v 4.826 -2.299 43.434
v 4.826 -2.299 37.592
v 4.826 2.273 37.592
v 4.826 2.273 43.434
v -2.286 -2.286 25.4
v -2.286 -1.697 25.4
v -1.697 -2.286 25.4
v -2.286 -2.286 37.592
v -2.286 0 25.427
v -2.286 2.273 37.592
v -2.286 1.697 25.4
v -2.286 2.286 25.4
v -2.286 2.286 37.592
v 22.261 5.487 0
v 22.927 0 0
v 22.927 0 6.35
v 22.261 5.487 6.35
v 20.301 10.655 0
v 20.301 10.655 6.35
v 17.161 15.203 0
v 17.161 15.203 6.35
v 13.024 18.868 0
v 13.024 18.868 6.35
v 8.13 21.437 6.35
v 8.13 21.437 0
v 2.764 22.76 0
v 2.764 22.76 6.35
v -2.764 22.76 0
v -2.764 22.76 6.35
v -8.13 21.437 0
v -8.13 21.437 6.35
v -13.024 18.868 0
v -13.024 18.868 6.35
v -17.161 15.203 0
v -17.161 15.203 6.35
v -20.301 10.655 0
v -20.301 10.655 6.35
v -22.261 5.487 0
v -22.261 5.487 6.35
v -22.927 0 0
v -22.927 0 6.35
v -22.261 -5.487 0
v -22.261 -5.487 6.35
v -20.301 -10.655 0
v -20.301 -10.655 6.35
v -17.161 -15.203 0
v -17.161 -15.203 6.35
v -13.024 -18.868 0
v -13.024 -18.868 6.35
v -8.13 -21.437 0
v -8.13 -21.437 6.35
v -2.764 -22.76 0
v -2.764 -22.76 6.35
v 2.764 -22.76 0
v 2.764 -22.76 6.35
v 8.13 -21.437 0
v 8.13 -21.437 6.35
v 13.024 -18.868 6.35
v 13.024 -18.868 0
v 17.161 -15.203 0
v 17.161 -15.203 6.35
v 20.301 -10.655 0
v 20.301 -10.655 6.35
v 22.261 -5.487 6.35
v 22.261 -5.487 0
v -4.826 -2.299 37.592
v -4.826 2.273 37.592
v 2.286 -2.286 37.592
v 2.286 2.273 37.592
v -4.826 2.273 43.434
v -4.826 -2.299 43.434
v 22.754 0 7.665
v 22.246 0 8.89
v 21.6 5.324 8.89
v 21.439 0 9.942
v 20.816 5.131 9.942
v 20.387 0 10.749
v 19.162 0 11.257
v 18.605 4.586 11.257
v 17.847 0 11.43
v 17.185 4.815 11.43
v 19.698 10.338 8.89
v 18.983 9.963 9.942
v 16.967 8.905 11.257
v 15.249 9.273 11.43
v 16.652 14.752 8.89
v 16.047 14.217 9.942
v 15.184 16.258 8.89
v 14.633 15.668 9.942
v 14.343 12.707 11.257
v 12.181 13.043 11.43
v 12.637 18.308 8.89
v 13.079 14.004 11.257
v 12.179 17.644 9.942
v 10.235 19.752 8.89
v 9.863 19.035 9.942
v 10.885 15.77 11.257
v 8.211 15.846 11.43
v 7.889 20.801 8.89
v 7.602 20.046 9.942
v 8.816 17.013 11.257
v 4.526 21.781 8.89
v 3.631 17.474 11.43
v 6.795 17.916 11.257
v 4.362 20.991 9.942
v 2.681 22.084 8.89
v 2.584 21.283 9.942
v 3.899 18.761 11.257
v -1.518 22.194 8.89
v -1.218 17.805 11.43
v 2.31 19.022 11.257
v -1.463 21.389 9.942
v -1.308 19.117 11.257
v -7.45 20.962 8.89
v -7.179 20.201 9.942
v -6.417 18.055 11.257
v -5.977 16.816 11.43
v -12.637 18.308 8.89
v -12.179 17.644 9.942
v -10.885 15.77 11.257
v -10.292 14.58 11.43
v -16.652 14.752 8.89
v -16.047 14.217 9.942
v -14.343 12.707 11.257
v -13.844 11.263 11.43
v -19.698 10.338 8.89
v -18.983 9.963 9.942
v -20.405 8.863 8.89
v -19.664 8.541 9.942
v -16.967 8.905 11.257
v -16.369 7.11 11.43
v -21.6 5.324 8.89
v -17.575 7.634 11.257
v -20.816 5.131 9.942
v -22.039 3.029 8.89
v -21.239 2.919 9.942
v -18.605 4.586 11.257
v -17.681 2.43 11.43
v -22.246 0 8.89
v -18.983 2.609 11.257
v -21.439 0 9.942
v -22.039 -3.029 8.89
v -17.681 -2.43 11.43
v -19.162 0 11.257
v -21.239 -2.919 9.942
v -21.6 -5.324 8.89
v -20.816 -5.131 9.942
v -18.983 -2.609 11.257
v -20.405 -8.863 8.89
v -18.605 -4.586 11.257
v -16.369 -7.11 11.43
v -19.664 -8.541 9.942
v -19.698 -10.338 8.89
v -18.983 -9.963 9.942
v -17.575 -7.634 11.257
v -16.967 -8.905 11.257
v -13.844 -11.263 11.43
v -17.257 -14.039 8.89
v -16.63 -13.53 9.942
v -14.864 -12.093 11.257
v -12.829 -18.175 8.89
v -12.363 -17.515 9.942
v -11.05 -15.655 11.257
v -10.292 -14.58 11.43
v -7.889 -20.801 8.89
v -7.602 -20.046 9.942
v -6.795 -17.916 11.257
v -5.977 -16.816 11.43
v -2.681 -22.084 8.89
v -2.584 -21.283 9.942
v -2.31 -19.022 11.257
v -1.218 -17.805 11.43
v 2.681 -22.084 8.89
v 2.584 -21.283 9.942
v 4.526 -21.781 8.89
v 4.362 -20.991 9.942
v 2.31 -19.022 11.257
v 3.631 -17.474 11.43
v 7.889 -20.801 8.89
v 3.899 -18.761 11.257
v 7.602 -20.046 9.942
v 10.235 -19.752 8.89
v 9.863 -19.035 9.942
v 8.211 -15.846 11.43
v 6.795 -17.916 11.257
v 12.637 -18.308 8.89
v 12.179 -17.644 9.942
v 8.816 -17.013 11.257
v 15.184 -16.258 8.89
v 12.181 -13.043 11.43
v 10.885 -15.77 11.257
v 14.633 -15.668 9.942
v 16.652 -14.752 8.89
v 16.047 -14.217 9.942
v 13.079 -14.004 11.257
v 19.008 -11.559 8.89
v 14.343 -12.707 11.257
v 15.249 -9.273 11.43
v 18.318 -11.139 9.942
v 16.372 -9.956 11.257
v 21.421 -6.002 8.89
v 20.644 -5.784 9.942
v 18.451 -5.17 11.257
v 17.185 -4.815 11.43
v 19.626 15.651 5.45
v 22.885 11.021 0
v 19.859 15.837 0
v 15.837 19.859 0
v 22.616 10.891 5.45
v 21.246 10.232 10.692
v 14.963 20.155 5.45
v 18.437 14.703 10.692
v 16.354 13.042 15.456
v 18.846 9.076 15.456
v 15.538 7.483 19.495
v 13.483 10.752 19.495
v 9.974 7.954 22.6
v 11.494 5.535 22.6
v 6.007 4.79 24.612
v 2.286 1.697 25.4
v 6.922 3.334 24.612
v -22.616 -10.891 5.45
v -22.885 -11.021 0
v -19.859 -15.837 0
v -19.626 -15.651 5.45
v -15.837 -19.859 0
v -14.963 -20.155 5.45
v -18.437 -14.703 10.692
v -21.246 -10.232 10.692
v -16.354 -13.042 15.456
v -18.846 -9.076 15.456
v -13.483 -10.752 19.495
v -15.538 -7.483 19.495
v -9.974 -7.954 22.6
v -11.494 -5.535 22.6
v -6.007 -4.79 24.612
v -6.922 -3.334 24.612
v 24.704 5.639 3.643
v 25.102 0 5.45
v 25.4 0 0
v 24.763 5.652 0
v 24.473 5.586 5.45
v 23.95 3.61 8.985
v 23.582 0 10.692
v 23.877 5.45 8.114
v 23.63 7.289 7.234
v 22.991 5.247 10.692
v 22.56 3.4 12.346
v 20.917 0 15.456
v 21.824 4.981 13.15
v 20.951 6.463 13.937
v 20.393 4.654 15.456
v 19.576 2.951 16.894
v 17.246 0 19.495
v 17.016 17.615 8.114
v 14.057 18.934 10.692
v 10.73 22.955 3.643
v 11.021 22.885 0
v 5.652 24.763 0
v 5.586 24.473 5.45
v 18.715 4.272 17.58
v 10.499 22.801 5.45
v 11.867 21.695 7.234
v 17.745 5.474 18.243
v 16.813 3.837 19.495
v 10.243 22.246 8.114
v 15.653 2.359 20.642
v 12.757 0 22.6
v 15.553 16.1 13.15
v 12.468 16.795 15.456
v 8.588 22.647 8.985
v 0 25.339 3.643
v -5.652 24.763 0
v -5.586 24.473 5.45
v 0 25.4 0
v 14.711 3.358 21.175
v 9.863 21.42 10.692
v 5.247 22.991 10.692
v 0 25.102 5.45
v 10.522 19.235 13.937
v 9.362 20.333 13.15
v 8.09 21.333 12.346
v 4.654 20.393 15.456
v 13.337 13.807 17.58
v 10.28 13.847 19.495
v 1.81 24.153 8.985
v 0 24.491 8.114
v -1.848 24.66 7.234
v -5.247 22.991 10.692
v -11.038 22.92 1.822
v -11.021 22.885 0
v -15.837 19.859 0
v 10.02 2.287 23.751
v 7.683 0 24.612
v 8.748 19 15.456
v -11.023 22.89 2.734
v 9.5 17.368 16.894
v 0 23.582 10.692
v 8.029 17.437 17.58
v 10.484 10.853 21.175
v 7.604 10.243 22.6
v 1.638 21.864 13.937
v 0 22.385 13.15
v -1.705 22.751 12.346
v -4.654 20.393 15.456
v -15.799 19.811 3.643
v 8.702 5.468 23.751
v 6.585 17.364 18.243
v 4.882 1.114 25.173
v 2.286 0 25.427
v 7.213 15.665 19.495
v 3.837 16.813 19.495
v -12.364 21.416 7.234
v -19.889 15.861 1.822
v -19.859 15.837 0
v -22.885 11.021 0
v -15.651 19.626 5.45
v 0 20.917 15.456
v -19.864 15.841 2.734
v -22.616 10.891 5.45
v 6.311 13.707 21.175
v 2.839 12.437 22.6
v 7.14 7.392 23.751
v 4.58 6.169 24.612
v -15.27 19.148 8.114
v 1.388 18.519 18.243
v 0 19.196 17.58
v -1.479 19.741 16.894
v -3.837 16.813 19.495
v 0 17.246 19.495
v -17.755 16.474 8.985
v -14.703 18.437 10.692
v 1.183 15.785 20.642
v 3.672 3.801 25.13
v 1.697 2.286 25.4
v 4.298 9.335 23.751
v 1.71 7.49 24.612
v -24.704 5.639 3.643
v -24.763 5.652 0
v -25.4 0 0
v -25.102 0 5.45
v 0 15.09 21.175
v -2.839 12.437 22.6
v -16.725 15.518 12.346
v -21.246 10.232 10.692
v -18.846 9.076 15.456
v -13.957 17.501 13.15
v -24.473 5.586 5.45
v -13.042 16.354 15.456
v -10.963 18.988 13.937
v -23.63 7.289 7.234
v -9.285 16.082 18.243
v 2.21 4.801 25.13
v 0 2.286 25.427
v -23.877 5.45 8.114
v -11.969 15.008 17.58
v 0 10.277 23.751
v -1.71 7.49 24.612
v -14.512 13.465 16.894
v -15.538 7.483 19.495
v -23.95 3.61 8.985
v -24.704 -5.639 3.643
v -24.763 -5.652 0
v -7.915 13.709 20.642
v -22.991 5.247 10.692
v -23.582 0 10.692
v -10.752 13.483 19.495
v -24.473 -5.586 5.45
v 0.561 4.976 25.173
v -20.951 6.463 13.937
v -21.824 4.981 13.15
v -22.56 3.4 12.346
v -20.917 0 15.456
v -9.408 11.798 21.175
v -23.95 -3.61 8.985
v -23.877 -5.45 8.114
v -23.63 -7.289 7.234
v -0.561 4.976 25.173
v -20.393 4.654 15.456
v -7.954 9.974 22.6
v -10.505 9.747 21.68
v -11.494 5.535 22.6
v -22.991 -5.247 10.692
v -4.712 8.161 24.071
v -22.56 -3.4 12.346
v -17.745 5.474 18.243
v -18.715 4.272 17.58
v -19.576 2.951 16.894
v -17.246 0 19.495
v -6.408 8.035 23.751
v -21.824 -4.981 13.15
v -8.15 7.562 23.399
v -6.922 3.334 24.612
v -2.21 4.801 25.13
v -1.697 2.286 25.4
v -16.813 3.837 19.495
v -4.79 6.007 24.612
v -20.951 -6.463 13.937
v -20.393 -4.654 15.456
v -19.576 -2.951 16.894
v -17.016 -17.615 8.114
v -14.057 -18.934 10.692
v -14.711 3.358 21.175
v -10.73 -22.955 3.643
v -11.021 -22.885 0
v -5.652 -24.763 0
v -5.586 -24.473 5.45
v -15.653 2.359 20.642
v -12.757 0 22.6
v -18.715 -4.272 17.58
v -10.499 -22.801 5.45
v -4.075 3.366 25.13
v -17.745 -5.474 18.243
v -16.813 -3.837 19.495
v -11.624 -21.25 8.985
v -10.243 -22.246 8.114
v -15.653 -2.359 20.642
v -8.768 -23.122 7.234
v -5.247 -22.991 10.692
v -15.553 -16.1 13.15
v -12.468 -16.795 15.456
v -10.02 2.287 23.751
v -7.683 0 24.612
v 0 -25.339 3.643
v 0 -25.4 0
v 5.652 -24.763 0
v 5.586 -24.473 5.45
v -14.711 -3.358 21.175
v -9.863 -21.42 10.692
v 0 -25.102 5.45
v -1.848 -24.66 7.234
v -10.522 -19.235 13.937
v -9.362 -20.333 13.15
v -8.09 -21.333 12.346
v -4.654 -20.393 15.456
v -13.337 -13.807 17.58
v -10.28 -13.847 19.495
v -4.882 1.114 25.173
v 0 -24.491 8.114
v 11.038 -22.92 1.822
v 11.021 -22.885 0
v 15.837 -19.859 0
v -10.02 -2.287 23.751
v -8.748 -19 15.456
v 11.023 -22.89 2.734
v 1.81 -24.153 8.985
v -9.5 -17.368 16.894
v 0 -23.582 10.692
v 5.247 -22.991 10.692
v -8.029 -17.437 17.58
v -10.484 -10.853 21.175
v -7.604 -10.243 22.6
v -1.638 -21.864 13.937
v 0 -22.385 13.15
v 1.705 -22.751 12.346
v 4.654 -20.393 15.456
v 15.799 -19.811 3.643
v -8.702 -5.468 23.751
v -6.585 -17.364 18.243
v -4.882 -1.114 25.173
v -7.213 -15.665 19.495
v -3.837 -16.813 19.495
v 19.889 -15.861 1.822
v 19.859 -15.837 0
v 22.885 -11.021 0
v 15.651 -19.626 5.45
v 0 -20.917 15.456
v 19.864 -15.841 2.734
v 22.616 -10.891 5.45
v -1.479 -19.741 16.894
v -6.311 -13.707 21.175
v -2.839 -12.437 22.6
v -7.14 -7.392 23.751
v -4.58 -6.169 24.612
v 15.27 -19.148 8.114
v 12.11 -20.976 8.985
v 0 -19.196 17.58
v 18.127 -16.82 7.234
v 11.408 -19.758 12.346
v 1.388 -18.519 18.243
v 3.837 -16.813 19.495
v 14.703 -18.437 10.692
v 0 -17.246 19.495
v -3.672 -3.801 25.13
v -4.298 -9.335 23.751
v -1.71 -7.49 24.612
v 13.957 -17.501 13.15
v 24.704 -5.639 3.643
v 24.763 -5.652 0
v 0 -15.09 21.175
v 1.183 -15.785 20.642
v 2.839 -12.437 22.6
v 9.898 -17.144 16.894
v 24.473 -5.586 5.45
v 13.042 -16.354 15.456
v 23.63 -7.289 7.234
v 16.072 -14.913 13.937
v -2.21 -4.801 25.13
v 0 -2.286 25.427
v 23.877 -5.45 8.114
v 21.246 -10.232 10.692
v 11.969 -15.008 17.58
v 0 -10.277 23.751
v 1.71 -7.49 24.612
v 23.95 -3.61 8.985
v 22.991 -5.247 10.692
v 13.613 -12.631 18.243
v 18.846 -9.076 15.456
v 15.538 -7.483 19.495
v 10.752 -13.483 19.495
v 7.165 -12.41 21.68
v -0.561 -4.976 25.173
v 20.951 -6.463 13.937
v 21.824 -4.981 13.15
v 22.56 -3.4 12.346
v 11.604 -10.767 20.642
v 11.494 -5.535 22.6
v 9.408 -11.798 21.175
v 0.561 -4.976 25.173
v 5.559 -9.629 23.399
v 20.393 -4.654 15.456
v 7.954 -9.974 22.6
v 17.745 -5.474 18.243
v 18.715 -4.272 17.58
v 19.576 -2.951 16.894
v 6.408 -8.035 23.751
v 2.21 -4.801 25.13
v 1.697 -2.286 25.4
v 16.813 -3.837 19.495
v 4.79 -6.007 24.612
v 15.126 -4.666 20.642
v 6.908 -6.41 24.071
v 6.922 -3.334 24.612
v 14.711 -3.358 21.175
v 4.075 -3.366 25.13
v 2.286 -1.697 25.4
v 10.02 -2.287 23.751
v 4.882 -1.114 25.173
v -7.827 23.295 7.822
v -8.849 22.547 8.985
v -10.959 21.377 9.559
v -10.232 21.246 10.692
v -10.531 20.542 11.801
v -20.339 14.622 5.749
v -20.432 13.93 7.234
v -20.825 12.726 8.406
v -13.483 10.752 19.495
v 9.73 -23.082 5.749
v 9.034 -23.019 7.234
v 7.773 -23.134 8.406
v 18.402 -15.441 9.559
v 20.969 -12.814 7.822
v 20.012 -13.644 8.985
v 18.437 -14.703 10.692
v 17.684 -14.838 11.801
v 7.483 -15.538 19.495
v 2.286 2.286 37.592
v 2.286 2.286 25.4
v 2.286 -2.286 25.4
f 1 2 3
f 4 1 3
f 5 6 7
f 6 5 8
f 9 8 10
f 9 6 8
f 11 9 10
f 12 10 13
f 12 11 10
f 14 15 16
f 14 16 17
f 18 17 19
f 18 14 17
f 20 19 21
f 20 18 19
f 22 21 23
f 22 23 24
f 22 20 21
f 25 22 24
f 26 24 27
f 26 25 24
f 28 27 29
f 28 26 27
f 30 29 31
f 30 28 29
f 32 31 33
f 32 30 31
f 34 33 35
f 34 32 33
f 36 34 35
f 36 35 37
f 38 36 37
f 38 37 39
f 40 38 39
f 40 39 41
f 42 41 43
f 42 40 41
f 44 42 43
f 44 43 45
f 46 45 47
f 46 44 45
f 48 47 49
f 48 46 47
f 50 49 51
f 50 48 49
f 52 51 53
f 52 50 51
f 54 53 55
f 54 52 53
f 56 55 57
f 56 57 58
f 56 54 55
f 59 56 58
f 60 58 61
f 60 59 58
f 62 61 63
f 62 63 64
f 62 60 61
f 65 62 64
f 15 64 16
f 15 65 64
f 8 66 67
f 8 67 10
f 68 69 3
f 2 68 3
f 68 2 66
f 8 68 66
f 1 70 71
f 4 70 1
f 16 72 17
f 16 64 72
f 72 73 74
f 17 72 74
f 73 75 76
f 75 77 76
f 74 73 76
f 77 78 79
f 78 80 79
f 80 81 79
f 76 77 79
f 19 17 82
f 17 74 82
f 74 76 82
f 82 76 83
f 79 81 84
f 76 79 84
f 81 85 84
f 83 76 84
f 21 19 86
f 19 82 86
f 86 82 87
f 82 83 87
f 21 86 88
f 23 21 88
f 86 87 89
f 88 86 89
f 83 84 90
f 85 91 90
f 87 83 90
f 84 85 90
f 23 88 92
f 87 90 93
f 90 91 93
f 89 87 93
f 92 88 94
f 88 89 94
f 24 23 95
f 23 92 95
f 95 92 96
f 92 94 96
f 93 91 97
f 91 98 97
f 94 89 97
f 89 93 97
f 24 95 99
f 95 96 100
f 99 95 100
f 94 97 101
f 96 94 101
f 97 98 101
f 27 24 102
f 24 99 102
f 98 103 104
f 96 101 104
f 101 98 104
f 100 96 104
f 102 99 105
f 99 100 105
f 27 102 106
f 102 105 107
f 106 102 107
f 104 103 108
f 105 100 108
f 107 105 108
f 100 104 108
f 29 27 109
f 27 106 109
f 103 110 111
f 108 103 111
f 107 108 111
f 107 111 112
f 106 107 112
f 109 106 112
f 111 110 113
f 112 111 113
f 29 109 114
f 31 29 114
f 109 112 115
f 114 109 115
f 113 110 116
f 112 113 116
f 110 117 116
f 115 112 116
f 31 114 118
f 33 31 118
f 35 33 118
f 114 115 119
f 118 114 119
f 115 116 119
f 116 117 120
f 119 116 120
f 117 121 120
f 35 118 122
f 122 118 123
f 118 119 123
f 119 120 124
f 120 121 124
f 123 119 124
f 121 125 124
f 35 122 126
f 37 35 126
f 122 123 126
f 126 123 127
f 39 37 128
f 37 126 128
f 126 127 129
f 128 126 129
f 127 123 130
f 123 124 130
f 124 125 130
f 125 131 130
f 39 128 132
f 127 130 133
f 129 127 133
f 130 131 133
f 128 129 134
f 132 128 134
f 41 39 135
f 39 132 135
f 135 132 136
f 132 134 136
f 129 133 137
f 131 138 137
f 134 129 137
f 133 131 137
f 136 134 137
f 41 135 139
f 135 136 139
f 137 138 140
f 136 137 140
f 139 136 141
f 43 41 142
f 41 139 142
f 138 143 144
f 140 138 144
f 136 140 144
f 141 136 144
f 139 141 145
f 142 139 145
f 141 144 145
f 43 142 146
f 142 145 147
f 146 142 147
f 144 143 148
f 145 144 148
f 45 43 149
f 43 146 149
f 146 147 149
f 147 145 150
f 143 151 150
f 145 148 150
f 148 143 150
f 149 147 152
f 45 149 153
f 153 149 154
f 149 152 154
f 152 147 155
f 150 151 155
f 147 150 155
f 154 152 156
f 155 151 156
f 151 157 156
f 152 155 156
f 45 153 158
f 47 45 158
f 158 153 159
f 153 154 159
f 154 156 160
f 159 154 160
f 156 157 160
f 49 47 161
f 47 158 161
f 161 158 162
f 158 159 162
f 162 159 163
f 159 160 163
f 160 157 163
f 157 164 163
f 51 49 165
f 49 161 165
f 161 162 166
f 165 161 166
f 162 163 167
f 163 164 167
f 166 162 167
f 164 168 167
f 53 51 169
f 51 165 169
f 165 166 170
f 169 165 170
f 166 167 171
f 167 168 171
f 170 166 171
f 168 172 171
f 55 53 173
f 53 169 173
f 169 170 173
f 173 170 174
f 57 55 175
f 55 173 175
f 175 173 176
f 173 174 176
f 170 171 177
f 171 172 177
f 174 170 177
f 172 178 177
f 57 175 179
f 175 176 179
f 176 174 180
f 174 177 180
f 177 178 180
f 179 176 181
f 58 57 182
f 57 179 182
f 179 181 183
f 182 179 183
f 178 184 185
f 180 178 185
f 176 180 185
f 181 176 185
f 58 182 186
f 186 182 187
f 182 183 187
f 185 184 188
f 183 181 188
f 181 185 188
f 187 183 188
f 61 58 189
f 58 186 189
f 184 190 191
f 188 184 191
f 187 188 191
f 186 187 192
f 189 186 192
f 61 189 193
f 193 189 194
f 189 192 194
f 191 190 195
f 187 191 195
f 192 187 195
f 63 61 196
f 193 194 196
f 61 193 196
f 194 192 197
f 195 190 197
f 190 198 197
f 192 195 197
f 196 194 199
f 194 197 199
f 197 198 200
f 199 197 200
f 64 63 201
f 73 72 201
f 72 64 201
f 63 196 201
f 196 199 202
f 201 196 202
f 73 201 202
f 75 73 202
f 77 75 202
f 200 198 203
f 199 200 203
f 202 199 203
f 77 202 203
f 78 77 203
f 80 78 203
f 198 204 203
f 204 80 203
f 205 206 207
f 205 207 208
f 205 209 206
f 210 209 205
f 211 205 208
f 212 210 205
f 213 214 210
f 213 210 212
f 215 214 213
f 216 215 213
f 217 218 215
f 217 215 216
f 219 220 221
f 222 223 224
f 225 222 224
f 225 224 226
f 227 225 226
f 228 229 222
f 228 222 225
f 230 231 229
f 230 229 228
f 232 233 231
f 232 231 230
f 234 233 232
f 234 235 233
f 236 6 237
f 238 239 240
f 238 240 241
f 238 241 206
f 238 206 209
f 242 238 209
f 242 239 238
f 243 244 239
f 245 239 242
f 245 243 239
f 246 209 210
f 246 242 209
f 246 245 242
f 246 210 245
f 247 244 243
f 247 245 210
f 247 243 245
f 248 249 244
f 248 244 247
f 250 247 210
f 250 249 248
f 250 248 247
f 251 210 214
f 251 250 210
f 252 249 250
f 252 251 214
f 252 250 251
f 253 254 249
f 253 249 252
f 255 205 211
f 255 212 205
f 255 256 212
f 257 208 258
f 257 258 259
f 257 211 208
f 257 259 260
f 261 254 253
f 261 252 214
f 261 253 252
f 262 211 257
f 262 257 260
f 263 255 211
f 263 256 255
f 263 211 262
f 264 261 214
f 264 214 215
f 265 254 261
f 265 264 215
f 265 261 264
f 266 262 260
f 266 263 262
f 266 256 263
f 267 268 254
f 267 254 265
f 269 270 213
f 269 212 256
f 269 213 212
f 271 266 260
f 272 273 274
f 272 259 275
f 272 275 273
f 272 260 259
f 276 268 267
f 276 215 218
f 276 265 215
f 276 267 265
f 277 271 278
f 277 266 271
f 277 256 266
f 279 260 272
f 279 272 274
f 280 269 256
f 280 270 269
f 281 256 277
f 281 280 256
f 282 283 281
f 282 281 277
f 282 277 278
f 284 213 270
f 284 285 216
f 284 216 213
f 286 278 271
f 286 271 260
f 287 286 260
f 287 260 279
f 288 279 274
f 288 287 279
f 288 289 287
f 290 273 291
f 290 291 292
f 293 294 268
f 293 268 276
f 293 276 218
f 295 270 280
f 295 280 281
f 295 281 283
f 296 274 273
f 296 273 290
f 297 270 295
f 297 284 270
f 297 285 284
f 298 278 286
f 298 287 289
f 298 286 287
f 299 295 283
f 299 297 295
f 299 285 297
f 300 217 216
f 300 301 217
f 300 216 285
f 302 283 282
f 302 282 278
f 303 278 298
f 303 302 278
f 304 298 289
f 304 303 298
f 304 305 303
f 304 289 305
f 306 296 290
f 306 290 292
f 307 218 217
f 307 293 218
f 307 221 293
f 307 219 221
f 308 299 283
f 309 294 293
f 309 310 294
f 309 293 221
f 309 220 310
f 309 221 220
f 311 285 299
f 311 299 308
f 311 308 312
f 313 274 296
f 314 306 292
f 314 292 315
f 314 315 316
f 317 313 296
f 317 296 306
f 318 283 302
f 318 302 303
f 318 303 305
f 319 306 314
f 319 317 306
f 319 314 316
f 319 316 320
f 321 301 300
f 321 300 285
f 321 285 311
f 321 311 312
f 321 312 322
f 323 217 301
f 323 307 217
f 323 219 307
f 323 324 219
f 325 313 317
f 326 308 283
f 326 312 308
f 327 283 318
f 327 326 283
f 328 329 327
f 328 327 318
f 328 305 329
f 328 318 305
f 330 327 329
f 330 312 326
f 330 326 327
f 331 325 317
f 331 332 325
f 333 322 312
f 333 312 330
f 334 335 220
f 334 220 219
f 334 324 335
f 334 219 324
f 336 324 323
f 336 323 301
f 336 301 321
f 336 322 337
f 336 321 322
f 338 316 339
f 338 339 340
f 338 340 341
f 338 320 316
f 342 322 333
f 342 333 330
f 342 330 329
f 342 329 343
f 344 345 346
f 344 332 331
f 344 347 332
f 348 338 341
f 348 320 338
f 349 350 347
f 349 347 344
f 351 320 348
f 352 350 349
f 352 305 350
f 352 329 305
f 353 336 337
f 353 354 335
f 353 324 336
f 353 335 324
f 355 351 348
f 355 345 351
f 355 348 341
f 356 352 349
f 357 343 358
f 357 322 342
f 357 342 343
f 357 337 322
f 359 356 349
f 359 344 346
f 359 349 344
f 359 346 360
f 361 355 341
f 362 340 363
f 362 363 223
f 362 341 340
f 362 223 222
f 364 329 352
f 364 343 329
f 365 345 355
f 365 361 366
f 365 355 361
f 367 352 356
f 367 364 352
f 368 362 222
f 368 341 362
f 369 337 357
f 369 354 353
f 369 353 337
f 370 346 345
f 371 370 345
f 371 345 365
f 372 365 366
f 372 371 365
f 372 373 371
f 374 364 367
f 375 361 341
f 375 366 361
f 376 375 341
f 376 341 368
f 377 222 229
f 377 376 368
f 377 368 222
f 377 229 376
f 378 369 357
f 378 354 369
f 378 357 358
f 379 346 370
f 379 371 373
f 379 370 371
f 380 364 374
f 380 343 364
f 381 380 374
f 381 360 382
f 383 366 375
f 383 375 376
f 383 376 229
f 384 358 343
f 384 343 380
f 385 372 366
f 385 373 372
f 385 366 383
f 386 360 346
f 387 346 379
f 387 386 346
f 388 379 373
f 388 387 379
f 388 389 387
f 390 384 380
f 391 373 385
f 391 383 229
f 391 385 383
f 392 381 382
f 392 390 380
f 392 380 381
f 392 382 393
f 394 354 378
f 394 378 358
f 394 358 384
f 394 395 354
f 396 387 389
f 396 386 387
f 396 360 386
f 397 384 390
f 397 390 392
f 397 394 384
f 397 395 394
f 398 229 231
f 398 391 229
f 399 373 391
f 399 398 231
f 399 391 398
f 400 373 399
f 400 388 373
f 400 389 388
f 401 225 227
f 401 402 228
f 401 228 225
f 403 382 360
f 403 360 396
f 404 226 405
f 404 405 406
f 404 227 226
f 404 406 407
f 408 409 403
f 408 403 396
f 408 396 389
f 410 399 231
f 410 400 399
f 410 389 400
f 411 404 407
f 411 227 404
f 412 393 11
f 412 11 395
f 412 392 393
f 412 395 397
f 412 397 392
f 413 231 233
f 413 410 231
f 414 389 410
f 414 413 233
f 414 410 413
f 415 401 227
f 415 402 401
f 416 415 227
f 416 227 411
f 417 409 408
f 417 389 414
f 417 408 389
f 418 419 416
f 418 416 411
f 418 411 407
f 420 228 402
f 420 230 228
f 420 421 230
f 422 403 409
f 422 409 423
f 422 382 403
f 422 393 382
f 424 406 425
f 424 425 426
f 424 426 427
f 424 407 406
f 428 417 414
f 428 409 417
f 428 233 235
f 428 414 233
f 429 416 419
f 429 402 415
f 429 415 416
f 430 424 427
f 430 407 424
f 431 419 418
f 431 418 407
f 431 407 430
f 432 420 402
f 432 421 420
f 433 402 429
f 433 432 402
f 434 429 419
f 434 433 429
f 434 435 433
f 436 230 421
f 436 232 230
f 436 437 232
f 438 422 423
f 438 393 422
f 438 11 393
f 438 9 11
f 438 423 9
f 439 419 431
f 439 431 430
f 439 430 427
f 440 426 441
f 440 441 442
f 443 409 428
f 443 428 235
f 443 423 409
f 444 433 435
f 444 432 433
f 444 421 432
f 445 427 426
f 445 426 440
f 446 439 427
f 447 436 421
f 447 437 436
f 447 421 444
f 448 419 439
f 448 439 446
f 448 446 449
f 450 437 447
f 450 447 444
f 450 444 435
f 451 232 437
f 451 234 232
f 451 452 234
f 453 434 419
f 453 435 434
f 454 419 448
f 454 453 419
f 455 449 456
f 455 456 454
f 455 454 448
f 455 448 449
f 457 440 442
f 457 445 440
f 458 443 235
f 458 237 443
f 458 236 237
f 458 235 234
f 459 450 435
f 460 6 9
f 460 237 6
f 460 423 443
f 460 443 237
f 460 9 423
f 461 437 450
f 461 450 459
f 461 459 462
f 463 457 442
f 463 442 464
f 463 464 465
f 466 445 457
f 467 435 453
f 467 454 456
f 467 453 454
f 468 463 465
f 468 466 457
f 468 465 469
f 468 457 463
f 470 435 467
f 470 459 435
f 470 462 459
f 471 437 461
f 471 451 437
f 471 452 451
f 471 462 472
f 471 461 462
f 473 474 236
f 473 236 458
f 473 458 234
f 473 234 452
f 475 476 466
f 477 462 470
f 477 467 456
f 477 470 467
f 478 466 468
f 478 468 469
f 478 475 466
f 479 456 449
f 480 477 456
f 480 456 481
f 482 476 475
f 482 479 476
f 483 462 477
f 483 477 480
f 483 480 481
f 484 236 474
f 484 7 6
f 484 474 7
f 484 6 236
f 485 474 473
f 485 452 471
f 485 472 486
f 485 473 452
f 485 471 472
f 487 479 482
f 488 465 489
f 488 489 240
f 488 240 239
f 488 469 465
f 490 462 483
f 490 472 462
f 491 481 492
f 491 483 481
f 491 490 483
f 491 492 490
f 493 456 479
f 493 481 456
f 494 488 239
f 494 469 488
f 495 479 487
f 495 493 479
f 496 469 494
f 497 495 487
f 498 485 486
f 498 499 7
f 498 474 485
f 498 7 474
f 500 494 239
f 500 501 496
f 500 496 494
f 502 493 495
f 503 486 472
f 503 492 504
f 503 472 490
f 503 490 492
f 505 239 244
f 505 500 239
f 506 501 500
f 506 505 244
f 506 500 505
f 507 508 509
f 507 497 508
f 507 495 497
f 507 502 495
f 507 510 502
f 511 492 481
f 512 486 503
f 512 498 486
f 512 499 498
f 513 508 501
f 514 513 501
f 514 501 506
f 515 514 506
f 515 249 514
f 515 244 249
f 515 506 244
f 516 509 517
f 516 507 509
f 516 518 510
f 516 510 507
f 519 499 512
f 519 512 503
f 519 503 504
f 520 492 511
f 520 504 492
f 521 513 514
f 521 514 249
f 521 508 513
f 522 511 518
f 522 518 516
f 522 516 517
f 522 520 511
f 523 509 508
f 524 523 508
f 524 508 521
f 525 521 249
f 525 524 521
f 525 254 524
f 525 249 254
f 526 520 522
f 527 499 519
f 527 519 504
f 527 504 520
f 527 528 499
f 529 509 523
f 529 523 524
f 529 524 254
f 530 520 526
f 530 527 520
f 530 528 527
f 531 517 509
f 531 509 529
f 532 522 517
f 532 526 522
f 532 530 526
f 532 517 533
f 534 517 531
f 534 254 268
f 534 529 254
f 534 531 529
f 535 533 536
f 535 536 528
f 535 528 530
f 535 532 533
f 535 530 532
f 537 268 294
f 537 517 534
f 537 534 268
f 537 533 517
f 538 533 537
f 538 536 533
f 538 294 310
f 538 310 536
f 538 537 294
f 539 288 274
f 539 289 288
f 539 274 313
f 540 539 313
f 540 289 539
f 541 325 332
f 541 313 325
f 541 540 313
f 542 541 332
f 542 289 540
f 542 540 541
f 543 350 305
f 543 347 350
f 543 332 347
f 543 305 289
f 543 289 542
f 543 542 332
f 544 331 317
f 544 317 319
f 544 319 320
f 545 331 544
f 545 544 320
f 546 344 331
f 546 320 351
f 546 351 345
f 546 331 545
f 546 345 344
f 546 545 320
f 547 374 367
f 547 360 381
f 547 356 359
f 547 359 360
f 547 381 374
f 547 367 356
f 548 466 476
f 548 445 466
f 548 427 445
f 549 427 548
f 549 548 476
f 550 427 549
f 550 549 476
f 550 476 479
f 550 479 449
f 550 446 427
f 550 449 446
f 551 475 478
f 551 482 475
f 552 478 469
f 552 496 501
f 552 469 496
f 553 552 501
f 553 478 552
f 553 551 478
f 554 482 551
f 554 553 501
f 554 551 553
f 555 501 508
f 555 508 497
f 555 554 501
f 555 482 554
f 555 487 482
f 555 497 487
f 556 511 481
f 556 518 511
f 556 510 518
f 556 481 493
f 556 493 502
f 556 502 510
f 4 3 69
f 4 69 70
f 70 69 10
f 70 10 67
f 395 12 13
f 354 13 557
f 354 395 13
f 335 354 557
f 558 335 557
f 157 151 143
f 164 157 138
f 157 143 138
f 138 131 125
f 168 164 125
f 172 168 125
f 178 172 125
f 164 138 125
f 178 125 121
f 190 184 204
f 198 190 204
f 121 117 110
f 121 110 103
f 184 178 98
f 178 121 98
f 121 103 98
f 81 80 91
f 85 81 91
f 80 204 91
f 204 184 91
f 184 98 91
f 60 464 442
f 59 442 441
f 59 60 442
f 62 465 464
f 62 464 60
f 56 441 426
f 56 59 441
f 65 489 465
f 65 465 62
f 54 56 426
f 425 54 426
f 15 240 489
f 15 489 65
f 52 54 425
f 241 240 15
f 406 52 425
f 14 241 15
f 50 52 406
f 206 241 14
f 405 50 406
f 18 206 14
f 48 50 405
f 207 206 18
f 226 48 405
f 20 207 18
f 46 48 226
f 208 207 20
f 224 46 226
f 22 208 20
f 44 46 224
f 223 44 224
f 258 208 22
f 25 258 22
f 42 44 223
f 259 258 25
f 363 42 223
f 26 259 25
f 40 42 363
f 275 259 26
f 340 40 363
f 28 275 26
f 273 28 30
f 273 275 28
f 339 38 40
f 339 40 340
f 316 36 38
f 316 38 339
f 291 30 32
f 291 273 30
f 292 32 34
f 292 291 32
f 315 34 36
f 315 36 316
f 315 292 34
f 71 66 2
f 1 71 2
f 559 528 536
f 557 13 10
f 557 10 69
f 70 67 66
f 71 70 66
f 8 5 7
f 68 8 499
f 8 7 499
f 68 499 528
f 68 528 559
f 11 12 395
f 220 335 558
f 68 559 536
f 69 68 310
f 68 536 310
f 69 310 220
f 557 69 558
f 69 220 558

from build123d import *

# Parameters (mm, degrees)
F3_DEPTH = 11.43
F4_R     = 5.08
F6_START = 25.4
F5_W     = 4.572
F5_H     = 4.572
F6_DEPTH = 12.192
F8_START = 37.592
F8_DEPTH = 5.842


with BuildPart() as f1:
    # F0 (on Front) → F1 (revolve)
    with BuildSketch(Plane.XZ):
        with BuildLine():
            Line((0, 25.4), (0, 0))
            Line((0, 0), (25.4, 0))
            ThreePointArc((25.4, 0), (18.4073156554, 18.4073156554), (0, 25.4))
        make_face()
    revolve(axis=Axis((0, 0, 12.7), (0, 0, 1)))

    # F2 (on Top) → F3 (cut)
    with BuildSketch(Plane.XY):
        with BuildLine():
            ThreePointArc((-22.9268872803, 0), (0, -22.9268872803), (22.9268872803, 0))
            ThreePointArc((22.9268872803, 0), (0, 22.9268872803), (-22.9268872803, 0))
        make_face()
    extrude(amount=F3_DEPTH, mode=Mode.SUBTRACT)

    # F4
    f4_edges = [f1.edges().sort_by_distance(p)[0] for p in [
        (-22.926887, 0, 11.43),
    ]]
    fillet(f4_edges, radius=F4_R)

    # F5 (on Top) → F6 (join)
    with BuildSketch(Plane.XY.offset(F6_START)):
        Rectangle(F5_W, F5_H)
    extrude(amount=F6_DEPTH)

    # F7 (on Top) → F8 (join)
    with BuildSketch(Plane.XY.offset(F8_START)):
        Polygon((-4.826, -2.2987), (0, -2.2987), (4.826, -2.2987), (4.826, 2.2733), (-4.826, 2.2733), align=None)
    extrude(amount=F8_DEPTH)


solid = f1.part
